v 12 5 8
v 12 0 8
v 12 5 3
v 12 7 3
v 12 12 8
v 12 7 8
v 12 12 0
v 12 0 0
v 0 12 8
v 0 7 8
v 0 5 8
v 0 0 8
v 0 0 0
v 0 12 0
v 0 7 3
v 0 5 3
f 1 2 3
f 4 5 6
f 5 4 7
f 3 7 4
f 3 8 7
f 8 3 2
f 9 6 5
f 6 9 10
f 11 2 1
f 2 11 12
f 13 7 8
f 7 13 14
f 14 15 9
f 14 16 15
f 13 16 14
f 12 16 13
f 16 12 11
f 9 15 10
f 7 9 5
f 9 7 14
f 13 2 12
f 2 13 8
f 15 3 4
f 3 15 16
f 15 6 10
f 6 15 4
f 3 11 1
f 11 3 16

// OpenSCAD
$fn = 32;

// ----------------------------------------------------------------------
// Micro clip: slotted block, 5-20 mm class
// ----------------------------------------------------------------------

// --- parameters (mm) ---
block_l = 12;             // block length, X
block_w = 12;             // block width, Y
block_h = 8;              // block height, Z
slot_w = 2;               // slot width
slot_d = 5;               // slot depth from the top

difference() {
  cube([block_l, block_w, block_h]);
  translate([-1, block_w / 2 - slot_w / 2, block_h - slot_d])
    cube([block_l + 2, slot_w, slot_d + 1]);
}
